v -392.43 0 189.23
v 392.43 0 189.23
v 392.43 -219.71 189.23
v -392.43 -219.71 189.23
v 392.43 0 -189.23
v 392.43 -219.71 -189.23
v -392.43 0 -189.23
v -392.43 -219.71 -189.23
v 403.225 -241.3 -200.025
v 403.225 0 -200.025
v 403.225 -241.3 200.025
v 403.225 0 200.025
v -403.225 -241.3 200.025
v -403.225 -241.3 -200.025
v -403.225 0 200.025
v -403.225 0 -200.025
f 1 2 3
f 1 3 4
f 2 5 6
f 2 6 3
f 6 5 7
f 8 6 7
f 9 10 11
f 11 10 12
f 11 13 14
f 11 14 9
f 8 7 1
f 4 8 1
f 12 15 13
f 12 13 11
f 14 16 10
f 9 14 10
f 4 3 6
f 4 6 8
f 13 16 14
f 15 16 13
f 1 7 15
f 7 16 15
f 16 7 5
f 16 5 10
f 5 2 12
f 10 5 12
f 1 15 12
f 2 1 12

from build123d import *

# Parameters (mm, degrees)
F0_W     = 806.45
F0_H     = 400.05
F1_DEPTH = 241.3
F2_W     = 784.86
F2_H     = 378.46
F3_DEPTH = 219.71


with BuildPart() as f1:
    # F0 (on Front) → F1 (new body)
    with BuildSketch(Plane.XZ):
        Rectangle(F0_W, F0_H)
    extrude(amount=F1_DEPTH)

    # F2 (on face) → F3 (cut)
    with BuildSketch(Plane(origin=(0, 0, 0), x_dir=(-1, 0, 0), z_dir=(0, 1, 0))):
        Rectangle(F2_W, F2_H)
    extrude(amount=-F3_DEPTH, mode=Mode.SUBTRACT)


solid = f1.part
